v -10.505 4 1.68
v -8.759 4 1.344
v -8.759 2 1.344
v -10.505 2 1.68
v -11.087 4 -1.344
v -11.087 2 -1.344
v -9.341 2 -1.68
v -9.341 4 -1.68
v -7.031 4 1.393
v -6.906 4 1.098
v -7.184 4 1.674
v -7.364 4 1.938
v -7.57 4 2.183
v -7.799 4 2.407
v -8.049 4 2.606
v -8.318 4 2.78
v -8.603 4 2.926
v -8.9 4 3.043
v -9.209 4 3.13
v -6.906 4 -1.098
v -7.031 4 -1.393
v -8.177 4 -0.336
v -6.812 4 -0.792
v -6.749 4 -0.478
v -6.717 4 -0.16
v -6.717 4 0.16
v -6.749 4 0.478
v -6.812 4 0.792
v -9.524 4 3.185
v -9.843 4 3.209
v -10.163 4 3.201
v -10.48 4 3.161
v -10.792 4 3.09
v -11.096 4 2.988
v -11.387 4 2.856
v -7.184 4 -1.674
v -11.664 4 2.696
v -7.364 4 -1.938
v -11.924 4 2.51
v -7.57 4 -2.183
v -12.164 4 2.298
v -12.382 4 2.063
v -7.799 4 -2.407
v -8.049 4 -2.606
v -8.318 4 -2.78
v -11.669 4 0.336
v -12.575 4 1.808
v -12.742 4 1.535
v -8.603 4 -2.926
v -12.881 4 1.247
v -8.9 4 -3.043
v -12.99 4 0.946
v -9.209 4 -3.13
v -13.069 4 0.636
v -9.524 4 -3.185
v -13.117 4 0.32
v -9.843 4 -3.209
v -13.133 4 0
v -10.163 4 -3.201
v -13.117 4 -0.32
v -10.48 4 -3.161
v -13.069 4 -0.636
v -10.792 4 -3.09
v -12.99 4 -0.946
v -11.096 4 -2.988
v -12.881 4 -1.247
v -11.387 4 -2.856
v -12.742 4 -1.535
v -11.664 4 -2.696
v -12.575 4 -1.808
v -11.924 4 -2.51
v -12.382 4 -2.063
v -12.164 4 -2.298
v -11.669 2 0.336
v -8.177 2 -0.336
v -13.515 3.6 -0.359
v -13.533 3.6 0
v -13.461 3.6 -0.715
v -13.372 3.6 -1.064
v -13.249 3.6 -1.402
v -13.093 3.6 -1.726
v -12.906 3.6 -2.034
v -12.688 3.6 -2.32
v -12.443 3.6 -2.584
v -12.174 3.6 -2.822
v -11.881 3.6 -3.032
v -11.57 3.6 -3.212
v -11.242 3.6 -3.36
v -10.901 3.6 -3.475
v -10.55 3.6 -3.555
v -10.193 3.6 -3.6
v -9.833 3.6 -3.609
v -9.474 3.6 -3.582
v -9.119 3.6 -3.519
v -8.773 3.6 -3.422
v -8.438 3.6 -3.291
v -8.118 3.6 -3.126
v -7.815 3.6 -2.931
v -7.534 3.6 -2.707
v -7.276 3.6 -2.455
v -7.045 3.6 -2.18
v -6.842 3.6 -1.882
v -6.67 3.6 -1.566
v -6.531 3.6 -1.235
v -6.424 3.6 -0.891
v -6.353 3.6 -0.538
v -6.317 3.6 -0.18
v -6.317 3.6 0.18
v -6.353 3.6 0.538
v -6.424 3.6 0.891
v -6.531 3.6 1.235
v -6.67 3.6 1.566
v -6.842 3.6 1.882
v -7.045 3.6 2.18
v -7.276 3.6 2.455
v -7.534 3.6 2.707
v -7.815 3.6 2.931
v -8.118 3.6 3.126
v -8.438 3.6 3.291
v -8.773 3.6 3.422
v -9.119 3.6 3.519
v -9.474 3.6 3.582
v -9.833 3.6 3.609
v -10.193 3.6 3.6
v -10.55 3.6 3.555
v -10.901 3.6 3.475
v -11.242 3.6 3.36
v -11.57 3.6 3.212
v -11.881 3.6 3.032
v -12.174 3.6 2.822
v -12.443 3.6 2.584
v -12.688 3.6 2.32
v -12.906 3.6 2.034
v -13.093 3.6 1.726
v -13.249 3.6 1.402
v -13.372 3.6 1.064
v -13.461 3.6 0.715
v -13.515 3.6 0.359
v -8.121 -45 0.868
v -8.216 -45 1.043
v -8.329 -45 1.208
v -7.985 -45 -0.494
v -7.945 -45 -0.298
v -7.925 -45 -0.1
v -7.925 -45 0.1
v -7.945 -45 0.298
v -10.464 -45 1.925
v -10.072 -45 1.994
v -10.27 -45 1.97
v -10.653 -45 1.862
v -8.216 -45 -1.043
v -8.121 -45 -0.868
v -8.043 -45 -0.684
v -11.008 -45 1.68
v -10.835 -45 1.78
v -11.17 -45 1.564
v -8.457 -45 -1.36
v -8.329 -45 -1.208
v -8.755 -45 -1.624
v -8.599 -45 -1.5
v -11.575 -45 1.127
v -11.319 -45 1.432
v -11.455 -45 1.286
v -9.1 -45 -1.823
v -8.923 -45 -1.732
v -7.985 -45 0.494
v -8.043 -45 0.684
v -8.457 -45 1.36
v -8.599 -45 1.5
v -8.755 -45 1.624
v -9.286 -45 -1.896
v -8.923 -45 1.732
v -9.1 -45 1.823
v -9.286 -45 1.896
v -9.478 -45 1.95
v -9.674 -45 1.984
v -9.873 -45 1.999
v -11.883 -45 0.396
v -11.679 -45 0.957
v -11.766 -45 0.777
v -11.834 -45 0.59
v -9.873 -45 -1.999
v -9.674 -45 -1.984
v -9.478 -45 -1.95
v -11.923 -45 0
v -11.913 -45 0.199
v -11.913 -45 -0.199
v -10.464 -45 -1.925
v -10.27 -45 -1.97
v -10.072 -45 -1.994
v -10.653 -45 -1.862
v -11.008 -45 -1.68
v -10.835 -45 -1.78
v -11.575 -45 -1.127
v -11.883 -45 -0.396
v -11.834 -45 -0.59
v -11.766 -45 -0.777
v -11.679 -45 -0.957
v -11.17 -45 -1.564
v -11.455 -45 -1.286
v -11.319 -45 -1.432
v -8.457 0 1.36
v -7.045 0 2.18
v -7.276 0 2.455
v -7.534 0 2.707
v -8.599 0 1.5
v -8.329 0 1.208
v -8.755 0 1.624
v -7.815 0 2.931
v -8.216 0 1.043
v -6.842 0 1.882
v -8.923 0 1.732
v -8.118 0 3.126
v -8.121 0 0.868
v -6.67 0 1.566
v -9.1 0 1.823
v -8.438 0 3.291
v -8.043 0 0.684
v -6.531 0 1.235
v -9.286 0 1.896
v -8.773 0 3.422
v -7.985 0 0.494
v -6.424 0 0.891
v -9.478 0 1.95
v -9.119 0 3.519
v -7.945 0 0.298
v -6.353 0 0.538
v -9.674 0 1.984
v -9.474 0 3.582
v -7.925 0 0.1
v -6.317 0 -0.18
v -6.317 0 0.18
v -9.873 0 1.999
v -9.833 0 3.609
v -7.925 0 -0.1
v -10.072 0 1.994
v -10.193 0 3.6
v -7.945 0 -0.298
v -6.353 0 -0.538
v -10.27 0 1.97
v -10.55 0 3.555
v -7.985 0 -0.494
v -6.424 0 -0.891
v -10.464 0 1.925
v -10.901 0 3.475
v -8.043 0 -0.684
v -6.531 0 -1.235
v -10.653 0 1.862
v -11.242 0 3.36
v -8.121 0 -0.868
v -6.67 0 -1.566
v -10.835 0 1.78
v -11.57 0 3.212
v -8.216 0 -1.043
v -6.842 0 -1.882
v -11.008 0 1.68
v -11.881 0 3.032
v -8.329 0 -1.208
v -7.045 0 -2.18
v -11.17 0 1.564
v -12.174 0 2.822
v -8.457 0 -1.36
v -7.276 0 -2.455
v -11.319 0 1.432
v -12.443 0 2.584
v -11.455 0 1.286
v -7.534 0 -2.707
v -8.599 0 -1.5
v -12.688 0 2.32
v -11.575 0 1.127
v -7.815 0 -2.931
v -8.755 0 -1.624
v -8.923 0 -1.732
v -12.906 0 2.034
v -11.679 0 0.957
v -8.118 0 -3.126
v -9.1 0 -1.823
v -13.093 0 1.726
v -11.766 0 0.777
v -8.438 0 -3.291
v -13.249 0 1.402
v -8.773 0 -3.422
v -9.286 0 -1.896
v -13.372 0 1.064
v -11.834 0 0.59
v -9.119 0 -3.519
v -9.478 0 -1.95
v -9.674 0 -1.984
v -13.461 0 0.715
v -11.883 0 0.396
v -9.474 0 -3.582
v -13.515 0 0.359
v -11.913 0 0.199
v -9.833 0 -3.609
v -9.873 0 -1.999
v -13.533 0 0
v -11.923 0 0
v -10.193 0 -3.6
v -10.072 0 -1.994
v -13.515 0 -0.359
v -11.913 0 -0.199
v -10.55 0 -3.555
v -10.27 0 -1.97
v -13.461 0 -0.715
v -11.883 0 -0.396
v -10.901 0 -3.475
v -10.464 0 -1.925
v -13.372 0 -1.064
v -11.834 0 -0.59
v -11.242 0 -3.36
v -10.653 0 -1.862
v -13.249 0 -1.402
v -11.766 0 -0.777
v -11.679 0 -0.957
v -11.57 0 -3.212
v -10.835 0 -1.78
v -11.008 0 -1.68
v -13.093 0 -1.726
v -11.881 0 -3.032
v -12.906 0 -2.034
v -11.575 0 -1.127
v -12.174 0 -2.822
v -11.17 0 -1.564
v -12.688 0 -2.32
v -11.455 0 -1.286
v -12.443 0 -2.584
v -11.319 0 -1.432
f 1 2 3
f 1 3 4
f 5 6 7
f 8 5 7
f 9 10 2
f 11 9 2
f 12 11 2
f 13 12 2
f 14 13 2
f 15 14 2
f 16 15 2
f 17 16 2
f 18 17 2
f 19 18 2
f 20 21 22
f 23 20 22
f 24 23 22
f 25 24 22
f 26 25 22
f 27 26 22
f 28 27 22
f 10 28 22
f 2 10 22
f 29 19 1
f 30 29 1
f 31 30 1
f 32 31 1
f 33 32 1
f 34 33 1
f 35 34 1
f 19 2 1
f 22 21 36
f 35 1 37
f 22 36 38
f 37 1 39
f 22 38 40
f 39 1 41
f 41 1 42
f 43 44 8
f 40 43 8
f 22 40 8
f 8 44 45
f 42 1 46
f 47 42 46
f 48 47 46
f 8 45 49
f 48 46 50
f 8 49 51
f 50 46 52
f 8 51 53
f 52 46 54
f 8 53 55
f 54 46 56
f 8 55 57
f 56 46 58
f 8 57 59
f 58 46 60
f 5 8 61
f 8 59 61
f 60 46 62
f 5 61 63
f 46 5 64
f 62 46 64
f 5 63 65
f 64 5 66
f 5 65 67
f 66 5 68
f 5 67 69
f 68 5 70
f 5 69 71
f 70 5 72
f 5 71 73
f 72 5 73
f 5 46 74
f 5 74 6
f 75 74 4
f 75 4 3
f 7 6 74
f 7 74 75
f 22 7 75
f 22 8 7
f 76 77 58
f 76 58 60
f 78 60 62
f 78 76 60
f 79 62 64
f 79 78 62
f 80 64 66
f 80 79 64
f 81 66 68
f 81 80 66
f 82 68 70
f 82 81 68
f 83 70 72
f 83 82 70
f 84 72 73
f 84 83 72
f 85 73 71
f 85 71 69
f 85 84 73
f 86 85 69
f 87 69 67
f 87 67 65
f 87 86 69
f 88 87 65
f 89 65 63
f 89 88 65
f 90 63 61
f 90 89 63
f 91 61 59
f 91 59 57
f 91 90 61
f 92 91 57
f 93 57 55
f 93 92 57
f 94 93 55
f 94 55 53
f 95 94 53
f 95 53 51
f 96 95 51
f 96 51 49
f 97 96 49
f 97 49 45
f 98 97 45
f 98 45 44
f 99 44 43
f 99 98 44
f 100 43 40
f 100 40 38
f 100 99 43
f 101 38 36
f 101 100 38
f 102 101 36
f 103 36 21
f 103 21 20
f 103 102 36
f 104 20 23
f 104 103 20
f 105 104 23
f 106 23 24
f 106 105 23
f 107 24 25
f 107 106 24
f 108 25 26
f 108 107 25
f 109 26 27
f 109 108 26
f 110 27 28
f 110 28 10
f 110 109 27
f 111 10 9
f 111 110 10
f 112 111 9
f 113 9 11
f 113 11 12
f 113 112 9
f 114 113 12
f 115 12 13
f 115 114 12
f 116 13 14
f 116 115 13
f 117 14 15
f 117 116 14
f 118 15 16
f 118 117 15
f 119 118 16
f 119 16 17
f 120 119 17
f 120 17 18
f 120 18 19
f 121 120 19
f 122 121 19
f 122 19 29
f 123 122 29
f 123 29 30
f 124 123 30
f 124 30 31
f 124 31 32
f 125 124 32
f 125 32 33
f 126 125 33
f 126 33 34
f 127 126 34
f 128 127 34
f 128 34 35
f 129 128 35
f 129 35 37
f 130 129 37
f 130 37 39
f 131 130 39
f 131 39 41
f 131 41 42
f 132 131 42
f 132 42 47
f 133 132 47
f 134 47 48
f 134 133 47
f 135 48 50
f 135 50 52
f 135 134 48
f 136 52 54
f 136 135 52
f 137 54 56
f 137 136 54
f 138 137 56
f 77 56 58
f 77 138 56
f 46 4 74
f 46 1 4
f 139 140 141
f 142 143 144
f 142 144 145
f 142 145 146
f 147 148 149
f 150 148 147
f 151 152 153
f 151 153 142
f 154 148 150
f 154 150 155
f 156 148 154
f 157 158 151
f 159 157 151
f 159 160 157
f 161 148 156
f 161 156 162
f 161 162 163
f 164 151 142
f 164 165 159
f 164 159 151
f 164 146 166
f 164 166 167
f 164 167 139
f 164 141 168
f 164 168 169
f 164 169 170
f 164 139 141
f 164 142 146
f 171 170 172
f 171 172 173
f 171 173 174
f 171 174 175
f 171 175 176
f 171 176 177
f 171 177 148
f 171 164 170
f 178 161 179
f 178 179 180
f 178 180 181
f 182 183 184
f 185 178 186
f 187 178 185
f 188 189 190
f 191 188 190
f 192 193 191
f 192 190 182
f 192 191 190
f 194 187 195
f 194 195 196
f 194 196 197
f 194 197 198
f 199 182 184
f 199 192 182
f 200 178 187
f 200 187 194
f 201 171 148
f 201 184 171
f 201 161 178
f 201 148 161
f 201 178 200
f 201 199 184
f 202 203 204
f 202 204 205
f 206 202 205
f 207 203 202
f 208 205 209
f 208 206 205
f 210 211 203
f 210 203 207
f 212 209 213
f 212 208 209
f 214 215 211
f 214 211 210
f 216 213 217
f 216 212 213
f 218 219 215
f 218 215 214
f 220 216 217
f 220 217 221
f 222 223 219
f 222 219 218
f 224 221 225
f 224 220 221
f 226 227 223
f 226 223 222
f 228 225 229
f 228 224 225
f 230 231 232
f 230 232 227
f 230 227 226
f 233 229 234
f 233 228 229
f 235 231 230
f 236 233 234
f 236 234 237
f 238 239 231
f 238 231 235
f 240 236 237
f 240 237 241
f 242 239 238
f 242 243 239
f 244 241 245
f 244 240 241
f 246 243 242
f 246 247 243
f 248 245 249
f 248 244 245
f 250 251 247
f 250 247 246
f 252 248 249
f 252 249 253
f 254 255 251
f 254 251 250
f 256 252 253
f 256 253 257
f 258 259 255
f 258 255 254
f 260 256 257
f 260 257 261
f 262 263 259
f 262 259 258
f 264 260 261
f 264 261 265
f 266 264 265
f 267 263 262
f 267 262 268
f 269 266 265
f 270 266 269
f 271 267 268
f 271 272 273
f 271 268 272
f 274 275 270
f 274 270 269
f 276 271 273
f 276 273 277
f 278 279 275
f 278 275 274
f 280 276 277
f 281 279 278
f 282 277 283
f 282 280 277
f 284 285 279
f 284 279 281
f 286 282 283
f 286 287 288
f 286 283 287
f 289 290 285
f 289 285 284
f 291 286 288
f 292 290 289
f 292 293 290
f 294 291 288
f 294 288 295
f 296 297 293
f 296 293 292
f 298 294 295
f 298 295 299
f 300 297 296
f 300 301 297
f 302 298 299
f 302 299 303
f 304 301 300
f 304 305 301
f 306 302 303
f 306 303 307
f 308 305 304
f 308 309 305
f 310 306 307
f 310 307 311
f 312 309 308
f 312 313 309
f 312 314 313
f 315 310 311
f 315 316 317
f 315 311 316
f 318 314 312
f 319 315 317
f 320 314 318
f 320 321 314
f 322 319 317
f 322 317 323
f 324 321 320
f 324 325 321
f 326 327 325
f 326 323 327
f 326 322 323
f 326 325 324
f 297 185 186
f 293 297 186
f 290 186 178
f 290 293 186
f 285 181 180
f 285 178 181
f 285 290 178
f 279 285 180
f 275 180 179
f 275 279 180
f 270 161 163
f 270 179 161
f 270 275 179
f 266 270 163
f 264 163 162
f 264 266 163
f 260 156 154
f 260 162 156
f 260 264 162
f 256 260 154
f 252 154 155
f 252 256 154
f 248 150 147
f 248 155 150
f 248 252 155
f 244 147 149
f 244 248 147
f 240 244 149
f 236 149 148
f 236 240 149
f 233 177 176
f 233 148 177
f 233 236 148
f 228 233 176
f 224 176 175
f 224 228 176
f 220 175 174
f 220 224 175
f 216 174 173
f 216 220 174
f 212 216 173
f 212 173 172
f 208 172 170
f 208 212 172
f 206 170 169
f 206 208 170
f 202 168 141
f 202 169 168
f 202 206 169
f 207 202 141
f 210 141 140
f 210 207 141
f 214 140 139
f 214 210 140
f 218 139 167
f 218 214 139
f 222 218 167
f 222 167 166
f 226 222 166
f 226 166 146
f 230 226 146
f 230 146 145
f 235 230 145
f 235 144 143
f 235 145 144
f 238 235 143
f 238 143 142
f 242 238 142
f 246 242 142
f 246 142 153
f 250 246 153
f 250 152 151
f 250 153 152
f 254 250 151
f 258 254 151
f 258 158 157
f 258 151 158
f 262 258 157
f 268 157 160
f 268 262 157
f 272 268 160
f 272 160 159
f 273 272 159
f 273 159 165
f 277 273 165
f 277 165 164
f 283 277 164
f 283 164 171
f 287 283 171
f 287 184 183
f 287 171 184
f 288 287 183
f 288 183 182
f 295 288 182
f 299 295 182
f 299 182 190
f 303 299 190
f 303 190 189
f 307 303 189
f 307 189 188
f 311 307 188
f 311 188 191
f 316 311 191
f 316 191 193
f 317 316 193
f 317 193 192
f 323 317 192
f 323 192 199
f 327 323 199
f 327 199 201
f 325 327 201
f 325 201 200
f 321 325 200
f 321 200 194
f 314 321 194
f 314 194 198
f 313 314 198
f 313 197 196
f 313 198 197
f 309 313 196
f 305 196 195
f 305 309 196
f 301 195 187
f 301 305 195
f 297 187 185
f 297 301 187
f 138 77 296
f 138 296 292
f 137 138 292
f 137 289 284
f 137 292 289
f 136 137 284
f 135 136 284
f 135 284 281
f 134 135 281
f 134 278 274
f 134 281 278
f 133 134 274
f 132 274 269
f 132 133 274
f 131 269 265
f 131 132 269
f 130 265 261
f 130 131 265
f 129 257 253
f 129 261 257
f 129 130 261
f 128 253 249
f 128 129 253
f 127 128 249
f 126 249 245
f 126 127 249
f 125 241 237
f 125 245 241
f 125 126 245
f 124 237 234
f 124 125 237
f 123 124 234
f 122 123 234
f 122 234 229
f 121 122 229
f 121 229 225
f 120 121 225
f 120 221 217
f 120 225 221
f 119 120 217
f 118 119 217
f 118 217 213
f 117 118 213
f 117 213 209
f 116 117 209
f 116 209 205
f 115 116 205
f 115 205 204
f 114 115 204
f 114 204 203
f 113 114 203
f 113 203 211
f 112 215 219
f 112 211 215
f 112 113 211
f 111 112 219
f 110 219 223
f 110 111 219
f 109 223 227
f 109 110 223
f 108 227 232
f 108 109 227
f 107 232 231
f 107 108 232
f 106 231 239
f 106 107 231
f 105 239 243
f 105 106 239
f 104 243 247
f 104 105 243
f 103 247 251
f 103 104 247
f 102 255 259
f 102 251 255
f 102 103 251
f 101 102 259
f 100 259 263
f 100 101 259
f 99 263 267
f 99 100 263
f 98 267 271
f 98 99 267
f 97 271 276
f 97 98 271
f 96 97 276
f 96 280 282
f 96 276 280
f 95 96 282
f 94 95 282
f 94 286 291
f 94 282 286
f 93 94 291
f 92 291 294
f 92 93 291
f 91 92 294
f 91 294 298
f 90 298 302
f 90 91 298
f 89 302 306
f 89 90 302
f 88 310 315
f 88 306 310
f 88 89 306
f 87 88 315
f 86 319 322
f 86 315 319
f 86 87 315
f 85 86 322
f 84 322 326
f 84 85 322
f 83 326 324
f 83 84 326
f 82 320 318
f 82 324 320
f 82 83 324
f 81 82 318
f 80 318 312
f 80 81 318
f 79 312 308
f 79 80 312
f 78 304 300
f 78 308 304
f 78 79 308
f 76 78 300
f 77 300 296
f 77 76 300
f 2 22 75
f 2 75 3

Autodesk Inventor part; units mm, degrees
ref_plane "YZ Plane" through (0, 0, 0) normal (1, 0, 0) x (0, 1, 0)
ref_plane "XZ Plane" through (0, 0, 0) normal (0, 1, 0) x (-1, 0, 0)
ref_plane "XY Plane" through (0, 0, 0) normal (0, 0, 1) x (1, 0, 0)
sketch "Sketch1" plane through (0, 0, 0) normal (0, 0, 1) x (1, 0, 0)
  line L0 (-9.9228, 0) -> (-13.5328, 0)
  line L1 (-13.5328, 0) -> (-13.5328, 4)
  line L2 (-13.5328, 4) -> (-9.9228, 4)
  line L3 (-9.9228, 4) -> (-9.9228, 0)
  line L4 (-9.9228, 0) -> (-9.9228, -45)
  line L5 (-9.9228, -45) -> (-11.9228, -45)
  line L6 (-11.9228, -45) -> (-11.9228, 0)
  point P0 (0, 0)
  dimension "d0" = 3.61
  dimension "d1" = 4
  dimension "d2" = 45
  dimension "d3" = 2
revolve "Revolution1" add sketch "Sketch1" angle 360 about axis through (-9.9228, 0, 0) along (0, -1, 0)
chamfer "Chamfer1" distance 0.4 angle 45 1 edges at (-6.3128, 4, 0)
sketch "Boceto2" plane through (-9.9228, 4, 0) normal (0, 1, 0) x (1, 0, 0)
  line L0 (1.1641, -1.3443) -> (-0.5821, -1.6803)
  line L1 (-0.5821, -1.6803) -> (-1.7462, -0.336)
  line L2 (-1.7462, -0.336) -> (-1.1641, 1.3443)
  line L3 (-1.1641, 1.3443) -> (0.5821, 1.6803)
  line L4 (0.5821, 1.6803) -> (1.7462, 0.336)
  line L5 (1.7462, 0.336) -> (1.1641, -1.3443)
  point P0 (9.9228, 0)
  point P1 (0, 0)
  dimension "d11" = 3.08
extrude "Extrusión1" cut sketch "Boceto2" against normal blind 2
thread "Rosca1" size "M4x0.7" class "6g" standard "ISO Metric profile" length 430
properties part number "Tornillo Allen cabeza cilindrica M4x50mm"
